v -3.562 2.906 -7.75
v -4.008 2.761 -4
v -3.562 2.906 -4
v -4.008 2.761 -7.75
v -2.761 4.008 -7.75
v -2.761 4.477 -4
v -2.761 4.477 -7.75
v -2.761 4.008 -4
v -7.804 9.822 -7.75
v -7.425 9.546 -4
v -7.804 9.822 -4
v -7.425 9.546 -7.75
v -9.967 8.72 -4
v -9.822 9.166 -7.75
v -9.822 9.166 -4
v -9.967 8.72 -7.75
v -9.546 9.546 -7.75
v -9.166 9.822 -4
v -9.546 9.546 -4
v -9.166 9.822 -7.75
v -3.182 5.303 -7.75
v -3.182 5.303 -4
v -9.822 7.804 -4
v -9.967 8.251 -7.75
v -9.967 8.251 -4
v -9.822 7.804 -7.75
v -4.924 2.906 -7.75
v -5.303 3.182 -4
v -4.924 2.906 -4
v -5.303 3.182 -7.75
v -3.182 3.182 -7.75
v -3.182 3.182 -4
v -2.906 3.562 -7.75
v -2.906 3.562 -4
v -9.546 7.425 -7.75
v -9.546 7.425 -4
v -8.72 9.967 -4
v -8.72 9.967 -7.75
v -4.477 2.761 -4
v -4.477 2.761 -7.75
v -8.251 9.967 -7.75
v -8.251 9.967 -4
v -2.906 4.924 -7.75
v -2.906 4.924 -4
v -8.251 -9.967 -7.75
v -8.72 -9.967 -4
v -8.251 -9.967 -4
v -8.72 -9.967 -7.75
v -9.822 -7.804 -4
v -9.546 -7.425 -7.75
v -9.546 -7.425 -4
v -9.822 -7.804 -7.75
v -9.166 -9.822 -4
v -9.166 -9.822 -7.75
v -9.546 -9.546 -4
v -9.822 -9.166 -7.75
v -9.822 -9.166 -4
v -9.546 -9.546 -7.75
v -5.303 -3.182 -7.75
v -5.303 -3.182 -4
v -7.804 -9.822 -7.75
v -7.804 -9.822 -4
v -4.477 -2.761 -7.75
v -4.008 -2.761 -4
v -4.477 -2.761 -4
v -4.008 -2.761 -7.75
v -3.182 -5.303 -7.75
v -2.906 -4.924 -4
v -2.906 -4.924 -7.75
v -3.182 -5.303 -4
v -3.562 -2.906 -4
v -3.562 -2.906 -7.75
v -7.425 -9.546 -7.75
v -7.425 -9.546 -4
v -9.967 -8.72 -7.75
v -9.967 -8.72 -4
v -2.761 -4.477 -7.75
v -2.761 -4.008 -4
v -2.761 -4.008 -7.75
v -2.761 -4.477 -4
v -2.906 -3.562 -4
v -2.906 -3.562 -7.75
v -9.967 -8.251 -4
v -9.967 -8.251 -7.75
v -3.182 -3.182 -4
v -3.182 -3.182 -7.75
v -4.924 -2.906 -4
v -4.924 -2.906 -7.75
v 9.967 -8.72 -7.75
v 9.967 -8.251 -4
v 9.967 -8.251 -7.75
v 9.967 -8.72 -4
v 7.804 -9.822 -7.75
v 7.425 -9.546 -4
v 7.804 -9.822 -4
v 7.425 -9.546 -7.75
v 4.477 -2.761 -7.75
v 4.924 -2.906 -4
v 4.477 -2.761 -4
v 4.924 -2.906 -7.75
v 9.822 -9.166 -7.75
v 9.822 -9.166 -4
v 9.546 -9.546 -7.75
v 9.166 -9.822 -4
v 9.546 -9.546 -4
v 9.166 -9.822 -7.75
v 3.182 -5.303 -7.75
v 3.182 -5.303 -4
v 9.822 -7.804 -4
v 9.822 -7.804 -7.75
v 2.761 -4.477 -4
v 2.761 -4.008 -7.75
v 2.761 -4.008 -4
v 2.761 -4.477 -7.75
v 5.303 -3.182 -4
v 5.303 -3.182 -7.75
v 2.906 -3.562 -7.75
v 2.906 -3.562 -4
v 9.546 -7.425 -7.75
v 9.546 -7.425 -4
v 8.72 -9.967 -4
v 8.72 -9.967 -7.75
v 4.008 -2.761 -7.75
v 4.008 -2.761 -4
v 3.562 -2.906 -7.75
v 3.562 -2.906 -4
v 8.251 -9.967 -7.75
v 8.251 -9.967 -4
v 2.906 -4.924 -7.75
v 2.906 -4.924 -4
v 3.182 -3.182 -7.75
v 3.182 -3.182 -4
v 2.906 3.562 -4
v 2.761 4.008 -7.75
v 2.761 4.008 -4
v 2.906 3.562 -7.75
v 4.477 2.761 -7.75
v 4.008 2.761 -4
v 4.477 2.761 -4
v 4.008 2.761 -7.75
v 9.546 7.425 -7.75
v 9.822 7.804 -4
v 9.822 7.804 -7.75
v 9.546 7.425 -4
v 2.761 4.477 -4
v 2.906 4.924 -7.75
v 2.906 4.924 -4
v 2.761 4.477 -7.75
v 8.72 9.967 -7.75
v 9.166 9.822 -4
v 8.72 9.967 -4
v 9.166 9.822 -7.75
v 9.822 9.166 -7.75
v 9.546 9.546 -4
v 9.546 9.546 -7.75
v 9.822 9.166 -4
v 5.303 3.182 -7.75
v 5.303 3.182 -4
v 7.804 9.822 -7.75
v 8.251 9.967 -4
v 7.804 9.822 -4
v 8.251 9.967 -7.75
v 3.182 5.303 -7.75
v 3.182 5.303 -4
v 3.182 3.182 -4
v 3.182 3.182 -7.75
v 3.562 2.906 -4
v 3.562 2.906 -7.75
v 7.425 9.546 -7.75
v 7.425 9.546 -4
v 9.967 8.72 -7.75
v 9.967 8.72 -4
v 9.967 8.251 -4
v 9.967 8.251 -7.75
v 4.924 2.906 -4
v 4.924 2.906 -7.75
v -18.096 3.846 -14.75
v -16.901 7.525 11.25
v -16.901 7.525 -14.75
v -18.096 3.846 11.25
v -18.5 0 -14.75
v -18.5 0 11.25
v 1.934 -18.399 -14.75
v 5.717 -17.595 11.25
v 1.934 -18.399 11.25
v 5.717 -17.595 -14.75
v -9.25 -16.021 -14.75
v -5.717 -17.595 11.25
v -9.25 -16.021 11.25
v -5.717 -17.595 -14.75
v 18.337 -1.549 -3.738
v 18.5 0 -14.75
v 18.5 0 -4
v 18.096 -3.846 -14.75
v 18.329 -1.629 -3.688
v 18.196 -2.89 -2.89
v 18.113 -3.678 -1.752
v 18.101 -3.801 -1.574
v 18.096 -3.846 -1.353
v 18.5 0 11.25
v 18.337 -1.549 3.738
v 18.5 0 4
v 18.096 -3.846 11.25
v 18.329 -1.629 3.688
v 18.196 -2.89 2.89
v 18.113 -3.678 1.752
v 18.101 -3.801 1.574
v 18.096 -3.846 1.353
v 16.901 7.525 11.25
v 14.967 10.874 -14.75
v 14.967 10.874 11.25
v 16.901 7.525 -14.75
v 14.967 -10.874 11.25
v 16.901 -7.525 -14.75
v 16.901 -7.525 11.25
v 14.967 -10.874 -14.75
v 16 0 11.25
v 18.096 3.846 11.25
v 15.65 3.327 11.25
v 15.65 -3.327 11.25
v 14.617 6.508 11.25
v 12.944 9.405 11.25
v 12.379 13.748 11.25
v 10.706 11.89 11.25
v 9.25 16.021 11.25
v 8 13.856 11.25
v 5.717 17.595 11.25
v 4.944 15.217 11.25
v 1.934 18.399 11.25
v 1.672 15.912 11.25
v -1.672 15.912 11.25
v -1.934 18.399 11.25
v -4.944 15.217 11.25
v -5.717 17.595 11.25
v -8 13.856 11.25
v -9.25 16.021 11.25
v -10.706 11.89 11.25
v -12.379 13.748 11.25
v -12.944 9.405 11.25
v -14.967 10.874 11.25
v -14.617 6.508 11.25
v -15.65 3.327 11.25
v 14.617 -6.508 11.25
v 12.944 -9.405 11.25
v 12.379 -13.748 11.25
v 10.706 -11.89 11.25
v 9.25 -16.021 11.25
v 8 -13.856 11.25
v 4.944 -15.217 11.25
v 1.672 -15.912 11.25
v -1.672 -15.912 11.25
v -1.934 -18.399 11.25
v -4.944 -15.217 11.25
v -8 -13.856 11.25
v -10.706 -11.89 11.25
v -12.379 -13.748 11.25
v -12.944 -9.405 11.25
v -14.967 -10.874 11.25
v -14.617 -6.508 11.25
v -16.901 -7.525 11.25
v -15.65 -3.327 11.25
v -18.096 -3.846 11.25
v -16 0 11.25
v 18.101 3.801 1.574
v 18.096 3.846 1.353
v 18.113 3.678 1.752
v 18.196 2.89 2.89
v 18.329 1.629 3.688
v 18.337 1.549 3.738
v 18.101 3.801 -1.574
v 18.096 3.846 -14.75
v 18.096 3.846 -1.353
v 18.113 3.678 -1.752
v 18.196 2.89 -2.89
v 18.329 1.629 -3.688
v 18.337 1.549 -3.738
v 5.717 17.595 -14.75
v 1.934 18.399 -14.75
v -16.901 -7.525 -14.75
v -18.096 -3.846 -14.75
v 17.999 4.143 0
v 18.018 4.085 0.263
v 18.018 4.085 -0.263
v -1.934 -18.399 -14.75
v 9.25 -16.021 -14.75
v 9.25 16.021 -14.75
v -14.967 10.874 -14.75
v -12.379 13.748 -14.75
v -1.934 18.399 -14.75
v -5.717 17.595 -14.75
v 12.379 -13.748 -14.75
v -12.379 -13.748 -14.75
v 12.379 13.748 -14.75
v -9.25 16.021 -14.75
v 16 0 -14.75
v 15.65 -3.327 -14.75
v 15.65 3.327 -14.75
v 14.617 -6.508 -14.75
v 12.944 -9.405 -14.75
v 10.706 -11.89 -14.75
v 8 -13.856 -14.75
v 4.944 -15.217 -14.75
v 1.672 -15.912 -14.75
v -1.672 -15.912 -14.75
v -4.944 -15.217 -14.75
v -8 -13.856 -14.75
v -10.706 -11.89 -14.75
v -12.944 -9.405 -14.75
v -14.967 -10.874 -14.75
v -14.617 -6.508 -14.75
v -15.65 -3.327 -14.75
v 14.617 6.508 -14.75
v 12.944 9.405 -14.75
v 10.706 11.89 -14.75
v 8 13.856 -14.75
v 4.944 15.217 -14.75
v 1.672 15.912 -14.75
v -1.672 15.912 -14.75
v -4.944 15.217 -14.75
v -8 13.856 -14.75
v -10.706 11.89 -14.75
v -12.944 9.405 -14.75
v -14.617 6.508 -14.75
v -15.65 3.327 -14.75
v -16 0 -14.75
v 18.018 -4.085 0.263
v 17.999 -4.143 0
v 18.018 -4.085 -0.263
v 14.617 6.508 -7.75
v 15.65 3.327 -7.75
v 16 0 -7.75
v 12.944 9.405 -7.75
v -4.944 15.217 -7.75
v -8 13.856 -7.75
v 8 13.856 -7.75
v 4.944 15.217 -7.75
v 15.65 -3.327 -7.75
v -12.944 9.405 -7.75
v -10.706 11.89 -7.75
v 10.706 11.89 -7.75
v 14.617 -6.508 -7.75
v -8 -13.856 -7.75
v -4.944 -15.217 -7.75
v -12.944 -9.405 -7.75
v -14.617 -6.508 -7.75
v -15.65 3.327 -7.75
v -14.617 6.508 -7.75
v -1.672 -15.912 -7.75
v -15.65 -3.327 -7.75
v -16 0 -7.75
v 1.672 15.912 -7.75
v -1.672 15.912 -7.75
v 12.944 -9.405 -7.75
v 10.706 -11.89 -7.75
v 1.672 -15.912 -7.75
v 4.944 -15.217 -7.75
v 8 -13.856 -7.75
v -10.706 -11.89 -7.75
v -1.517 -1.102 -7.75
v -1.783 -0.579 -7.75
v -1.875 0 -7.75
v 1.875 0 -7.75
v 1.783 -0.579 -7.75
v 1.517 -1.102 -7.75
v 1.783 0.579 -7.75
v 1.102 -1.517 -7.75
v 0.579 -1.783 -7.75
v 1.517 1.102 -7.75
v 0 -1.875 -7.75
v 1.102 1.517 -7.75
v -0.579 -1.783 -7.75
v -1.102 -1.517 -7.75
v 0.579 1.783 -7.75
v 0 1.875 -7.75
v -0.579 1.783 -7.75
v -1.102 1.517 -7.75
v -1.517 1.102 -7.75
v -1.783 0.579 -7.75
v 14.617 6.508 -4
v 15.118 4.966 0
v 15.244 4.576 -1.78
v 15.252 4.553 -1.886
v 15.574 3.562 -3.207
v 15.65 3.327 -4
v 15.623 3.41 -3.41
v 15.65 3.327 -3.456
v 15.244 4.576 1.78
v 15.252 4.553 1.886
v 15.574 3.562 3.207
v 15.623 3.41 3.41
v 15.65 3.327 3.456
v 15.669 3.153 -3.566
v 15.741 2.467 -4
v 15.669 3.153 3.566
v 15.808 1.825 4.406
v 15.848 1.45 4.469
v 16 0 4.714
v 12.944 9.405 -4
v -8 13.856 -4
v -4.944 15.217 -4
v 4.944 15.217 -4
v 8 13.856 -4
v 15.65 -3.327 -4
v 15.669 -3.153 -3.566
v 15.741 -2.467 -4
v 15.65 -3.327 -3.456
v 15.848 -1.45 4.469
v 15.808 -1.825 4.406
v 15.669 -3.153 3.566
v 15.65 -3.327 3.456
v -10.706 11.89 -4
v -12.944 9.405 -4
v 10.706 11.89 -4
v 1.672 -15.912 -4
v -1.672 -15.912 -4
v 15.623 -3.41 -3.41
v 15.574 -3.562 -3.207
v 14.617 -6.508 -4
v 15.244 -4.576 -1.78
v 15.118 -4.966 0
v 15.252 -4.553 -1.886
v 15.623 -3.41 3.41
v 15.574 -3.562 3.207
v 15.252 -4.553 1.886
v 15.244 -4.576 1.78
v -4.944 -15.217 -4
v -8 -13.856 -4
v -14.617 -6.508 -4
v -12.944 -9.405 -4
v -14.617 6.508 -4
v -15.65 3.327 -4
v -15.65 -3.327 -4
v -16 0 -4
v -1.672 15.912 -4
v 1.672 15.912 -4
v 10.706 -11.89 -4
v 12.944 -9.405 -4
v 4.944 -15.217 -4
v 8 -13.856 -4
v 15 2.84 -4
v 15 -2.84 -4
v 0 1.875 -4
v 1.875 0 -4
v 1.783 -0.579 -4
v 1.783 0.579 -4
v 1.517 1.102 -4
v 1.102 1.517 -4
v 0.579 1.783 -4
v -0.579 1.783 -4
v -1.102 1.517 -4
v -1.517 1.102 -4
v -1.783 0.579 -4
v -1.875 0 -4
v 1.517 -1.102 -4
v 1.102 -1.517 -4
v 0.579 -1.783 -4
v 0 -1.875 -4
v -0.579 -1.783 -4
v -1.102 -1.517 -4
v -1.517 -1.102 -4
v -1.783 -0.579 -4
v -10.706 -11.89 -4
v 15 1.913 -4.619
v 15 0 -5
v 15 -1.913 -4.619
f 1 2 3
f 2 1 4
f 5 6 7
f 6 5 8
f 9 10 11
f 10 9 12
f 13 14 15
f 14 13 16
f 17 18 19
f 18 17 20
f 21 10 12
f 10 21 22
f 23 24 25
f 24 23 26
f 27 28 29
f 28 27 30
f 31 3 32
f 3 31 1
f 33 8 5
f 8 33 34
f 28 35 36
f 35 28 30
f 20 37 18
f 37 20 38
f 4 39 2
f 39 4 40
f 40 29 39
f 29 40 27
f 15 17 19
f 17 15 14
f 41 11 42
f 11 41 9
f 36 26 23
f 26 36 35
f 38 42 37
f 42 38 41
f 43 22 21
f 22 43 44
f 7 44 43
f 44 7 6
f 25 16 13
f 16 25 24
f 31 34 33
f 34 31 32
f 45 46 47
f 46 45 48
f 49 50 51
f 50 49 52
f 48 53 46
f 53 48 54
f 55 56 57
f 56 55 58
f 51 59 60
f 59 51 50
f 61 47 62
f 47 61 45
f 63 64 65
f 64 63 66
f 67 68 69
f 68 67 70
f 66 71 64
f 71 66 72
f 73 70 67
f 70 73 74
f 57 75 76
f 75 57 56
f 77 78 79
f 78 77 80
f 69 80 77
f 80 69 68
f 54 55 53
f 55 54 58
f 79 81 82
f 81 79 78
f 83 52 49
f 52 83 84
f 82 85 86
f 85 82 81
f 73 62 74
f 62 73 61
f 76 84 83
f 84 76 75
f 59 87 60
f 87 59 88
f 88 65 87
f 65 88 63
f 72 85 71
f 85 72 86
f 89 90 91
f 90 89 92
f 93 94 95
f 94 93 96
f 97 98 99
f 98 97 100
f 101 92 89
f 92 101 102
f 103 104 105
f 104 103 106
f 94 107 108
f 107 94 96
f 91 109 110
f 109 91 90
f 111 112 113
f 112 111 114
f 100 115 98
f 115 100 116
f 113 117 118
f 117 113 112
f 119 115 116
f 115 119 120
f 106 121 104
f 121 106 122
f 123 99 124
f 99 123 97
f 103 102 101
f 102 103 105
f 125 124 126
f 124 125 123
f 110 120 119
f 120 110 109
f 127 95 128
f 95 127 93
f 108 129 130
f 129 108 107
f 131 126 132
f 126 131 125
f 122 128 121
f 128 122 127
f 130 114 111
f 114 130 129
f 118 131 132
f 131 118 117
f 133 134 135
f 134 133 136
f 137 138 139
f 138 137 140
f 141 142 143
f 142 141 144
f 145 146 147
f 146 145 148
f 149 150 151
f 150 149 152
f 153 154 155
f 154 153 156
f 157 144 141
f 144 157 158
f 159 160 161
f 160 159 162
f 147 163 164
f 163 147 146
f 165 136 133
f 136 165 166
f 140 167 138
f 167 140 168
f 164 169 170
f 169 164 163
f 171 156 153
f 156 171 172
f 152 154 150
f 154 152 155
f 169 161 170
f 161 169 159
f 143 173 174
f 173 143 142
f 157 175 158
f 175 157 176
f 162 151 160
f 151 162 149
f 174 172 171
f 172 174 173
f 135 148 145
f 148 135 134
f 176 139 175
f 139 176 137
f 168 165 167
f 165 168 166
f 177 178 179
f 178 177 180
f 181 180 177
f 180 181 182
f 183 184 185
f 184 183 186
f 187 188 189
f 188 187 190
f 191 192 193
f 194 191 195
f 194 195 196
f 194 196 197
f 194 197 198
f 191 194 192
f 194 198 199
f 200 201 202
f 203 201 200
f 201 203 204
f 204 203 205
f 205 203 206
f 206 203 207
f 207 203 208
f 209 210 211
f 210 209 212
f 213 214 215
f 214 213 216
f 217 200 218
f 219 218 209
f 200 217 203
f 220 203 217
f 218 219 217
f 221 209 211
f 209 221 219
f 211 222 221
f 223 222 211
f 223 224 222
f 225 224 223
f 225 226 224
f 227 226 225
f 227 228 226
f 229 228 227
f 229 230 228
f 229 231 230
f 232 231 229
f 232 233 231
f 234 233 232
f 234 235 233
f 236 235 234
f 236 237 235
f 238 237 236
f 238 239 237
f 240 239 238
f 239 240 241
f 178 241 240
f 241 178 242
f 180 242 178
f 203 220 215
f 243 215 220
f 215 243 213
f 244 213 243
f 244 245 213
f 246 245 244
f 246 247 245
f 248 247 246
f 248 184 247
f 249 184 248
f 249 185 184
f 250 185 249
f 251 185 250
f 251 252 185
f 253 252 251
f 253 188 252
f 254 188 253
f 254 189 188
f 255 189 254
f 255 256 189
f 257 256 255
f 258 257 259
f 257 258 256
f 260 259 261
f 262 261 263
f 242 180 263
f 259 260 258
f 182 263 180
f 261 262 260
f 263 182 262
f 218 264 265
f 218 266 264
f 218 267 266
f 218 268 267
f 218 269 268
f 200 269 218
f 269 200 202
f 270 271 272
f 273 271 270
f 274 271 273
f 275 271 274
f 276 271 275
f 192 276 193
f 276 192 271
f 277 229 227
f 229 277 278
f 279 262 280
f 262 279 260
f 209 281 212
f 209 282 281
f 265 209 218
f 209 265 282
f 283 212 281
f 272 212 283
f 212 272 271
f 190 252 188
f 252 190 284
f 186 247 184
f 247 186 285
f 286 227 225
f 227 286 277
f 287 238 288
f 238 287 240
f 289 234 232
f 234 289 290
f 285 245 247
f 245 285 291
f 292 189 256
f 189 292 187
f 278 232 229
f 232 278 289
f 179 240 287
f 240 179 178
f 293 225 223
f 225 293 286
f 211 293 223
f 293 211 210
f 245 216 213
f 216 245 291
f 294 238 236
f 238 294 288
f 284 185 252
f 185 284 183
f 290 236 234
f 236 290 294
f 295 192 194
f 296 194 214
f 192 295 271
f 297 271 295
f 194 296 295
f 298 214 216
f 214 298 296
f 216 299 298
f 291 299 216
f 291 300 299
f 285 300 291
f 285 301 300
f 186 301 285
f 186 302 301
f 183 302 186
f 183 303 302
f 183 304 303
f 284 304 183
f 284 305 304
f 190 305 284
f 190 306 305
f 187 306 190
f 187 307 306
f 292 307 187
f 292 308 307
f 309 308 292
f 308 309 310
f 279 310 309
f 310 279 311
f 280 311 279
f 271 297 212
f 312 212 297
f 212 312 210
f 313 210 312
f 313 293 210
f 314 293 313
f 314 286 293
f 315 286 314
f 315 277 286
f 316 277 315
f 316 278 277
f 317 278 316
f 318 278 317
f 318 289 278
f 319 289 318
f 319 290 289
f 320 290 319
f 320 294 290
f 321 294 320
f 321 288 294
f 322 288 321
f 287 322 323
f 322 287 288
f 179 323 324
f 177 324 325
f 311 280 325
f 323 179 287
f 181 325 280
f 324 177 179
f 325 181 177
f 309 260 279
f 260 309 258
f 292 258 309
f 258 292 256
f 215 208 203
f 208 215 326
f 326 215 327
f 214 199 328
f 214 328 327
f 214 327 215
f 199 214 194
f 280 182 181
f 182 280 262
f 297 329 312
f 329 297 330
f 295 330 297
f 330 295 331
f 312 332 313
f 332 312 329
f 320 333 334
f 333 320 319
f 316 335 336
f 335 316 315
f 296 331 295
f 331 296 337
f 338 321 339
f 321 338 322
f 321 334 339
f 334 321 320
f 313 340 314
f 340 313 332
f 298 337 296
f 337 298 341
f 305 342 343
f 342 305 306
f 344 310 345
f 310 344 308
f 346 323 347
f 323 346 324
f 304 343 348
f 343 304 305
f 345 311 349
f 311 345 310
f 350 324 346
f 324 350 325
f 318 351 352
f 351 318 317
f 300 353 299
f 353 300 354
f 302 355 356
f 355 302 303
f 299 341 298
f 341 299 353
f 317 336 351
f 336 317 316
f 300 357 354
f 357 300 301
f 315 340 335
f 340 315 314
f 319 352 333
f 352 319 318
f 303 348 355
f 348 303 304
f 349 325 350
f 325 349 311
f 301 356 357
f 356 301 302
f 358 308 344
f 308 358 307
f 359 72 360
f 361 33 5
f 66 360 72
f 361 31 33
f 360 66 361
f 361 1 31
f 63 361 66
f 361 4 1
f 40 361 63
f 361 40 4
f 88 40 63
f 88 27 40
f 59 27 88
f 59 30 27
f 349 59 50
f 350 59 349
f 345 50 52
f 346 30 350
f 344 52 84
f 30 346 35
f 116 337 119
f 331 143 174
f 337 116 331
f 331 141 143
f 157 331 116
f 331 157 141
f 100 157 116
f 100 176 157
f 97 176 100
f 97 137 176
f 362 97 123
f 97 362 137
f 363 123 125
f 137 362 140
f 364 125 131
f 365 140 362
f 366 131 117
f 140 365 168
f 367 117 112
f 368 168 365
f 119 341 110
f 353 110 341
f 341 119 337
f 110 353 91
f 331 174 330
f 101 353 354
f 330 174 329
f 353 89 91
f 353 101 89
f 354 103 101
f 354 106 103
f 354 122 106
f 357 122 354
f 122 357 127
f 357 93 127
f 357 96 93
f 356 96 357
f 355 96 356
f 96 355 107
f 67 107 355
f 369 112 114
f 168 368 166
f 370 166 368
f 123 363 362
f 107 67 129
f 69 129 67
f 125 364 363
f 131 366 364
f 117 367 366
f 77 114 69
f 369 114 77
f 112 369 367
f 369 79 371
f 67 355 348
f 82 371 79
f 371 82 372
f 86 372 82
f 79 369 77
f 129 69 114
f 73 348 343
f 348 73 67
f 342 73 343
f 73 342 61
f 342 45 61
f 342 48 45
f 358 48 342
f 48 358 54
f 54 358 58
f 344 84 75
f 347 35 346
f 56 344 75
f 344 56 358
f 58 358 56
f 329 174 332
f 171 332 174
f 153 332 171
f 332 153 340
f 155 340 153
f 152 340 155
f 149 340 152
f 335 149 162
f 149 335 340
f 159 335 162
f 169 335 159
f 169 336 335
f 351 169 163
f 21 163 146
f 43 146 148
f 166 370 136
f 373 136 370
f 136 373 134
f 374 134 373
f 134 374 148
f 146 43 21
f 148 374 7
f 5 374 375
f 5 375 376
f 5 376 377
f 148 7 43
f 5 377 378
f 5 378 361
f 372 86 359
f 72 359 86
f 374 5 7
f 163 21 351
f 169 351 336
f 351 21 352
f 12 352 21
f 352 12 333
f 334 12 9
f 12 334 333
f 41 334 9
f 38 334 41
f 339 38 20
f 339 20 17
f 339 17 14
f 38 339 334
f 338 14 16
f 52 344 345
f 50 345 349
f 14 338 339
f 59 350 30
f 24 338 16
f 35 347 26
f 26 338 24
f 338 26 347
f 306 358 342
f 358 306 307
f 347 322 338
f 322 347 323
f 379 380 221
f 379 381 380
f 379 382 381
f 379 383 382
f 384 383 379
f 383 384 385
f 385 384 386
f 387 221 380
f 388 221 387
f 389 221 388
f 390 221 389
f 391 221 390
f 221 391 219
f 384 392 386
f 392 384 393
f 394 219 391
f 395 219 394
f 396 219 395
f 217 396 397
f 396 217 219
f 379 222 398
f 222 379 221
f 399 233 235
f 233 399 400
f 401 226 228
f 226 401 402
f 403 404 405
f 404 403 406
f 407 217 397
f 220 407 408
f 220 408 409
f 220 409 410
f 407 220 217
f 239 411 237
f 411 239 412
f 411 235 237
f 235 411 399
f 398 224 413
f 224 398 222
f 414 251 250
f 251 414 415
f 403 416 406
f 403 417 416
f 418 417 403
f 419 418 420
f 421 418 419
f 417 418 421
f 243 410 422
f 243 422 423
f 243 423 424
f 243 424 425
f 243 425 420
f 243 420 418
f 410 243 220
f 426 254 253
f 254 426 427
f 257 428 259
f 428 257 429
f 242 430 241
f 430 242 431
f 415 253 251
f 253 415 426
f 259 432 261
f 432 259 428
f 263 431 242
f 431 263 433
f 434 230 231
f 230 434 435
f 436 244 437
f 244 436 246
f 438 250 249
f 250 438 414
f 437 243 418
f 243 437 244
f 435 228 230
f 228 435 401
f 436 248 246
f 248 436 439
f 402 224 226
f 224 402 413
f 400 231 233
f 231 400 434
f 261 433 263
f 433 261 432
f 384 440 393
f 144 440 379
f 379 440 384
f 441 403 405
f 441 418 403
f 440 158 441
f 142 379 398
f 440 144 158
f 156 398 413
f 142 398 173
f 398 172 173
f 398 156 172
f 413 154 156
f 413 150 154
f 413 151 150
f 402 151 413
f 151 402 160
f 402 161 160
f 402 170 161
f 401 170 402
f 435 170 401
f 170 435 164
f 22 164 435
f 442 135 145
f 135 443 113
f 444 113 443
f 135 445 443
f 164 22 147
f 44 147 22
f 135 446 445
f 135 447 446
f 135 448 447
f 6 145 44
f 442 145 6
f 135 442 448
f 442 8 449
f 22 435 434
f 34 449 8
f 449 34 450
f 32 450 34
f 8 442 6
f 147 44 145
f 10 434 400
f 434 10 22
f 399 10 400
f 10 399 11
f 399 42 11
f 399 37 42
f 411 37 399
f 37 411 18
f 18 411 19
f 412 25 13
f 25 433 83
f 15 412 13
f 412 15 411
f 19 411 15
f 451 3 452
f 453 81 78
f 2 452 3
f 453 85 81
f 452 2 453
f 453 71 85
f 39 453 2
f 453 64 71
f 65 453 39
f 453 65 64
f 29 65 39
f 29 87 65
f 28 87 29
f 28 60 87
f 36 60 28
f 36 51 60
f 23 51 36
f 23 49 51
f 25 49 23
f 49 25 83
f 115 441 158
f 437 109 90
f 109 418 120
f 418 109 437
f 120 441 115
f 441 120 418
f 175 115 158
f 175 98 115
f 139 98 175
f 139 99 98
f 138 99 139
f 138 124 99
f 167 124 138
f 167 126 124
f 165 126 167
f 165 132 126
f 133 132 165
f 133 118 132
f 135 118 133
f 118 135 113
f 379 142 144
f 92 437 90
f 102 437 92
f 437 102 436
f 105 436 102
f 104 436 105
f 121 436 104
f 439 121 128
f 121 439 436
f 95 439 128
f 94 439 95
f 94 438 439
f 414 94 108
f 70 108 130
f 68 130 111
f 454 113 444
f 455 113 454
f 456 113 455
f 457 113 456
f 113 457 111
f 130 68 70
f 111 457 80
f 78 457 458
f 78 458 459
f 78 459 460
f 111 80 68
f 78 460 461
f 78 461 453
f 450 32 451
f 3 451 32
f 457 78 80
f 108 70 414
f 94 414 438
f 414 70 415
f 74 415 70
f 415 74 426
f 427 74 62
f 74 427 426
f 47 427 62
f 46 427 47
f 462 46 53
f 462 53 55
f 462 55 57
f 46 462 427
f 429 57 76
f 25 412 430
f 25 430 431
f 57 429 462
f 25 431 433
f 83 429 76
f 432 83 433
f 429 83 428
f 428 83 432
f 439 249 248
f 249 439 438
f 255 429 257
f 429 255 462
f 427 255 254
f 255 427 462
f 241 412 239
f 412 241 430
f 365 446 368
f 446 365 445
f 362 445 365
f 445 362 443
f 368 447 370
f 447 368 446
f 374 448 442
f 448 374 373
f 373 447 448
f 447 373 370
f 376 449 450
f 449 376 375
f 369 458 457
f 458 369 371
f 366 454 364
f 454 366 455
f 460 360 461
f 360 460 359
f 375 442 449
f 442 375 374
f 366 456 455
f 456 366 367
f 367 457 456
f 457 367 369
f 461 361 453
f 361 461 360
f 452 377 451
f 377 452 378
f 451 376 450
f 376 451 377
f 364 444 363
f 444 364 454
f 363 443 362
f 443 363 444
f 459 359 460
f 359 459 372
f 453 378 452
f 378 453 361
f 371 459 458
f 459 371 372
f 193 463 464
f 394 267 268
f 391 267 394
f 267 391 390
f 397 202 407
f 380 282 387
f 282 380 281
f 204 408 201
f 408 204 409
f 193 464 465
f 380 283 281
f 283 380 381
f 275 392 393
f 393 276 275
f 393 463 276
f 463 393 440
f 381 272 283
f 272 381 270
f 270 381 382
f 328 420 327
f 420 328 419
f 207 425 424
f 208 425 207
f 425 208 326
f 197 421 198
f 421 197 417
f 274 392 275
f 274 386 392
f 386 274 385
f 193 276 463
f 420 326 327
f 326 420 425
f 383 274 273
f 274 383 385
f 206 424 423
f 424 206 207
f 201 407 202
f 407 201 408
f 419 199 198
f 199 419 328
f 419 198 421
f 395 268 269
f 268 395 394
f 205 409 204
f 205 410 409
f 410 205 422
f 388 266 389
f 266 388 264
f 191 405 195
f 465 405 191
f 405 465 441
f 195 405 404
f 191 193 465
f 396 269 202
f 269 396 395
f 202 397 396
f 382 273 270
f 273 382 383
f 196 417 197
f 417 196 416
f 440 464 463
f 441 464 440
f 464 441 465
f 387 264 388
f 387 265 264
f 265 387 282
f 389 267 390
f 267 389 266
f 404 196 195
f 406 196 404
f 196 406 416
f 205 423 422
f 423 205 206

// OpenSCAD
/**
 * motorMount.scad
 * 
 * Common piece for holding a brushless motor
 * 
 * Created by Diego Viejo after the idea of OpenRC copter from Daniel Noree
 * 21/May/2015
 * 
 */

outerDiam = 37;
innerDiam = 32;

height = 26;

platformHeight = 7;
platformWidth = 3.75;

axleDiam = 3.75;

//wire openning
wireDiameter = 8;

module motorMount() translate([0, 0, -(platformHeight + platformWidth + wireDiameter/2)])
{
    difference()
    {
        cylinder(d=outerDiam, h=height);
        
        translate([0, 0, -1]) cylinder(d=innerDiam, h=1+platformHeight);
        translate([0, 0, platformHeight + platformWidth]) cylinder(d=innerDiam, h=height);
        
        //Motor axle if exists
        cylinder(d=axleDiam, h=height, $fn=20);
        
        //Mounting holes
        for(i=[1:2:8])
        {
            echo(i);
            echo(45*i);
            rotate(45*i) hull()
            {
                translate([0, 6, 0]) cylinder(d=3, h=height, $fn=20);
                translate([0, 12, 0]) cylinder(d=3, h=height, $fn=20);
            }
        }
        
        //wire openning
        #translate([innerDiam/2-1, 0, platformHeight + platformWidth + wireDiameter/2]) rotate([0, 90, 0]) cylinder(d2=wireDiameter, d1=wireDiameter+2, h=(outerDiam-innerDiam)/2+1);
    }
}


motorMount();
